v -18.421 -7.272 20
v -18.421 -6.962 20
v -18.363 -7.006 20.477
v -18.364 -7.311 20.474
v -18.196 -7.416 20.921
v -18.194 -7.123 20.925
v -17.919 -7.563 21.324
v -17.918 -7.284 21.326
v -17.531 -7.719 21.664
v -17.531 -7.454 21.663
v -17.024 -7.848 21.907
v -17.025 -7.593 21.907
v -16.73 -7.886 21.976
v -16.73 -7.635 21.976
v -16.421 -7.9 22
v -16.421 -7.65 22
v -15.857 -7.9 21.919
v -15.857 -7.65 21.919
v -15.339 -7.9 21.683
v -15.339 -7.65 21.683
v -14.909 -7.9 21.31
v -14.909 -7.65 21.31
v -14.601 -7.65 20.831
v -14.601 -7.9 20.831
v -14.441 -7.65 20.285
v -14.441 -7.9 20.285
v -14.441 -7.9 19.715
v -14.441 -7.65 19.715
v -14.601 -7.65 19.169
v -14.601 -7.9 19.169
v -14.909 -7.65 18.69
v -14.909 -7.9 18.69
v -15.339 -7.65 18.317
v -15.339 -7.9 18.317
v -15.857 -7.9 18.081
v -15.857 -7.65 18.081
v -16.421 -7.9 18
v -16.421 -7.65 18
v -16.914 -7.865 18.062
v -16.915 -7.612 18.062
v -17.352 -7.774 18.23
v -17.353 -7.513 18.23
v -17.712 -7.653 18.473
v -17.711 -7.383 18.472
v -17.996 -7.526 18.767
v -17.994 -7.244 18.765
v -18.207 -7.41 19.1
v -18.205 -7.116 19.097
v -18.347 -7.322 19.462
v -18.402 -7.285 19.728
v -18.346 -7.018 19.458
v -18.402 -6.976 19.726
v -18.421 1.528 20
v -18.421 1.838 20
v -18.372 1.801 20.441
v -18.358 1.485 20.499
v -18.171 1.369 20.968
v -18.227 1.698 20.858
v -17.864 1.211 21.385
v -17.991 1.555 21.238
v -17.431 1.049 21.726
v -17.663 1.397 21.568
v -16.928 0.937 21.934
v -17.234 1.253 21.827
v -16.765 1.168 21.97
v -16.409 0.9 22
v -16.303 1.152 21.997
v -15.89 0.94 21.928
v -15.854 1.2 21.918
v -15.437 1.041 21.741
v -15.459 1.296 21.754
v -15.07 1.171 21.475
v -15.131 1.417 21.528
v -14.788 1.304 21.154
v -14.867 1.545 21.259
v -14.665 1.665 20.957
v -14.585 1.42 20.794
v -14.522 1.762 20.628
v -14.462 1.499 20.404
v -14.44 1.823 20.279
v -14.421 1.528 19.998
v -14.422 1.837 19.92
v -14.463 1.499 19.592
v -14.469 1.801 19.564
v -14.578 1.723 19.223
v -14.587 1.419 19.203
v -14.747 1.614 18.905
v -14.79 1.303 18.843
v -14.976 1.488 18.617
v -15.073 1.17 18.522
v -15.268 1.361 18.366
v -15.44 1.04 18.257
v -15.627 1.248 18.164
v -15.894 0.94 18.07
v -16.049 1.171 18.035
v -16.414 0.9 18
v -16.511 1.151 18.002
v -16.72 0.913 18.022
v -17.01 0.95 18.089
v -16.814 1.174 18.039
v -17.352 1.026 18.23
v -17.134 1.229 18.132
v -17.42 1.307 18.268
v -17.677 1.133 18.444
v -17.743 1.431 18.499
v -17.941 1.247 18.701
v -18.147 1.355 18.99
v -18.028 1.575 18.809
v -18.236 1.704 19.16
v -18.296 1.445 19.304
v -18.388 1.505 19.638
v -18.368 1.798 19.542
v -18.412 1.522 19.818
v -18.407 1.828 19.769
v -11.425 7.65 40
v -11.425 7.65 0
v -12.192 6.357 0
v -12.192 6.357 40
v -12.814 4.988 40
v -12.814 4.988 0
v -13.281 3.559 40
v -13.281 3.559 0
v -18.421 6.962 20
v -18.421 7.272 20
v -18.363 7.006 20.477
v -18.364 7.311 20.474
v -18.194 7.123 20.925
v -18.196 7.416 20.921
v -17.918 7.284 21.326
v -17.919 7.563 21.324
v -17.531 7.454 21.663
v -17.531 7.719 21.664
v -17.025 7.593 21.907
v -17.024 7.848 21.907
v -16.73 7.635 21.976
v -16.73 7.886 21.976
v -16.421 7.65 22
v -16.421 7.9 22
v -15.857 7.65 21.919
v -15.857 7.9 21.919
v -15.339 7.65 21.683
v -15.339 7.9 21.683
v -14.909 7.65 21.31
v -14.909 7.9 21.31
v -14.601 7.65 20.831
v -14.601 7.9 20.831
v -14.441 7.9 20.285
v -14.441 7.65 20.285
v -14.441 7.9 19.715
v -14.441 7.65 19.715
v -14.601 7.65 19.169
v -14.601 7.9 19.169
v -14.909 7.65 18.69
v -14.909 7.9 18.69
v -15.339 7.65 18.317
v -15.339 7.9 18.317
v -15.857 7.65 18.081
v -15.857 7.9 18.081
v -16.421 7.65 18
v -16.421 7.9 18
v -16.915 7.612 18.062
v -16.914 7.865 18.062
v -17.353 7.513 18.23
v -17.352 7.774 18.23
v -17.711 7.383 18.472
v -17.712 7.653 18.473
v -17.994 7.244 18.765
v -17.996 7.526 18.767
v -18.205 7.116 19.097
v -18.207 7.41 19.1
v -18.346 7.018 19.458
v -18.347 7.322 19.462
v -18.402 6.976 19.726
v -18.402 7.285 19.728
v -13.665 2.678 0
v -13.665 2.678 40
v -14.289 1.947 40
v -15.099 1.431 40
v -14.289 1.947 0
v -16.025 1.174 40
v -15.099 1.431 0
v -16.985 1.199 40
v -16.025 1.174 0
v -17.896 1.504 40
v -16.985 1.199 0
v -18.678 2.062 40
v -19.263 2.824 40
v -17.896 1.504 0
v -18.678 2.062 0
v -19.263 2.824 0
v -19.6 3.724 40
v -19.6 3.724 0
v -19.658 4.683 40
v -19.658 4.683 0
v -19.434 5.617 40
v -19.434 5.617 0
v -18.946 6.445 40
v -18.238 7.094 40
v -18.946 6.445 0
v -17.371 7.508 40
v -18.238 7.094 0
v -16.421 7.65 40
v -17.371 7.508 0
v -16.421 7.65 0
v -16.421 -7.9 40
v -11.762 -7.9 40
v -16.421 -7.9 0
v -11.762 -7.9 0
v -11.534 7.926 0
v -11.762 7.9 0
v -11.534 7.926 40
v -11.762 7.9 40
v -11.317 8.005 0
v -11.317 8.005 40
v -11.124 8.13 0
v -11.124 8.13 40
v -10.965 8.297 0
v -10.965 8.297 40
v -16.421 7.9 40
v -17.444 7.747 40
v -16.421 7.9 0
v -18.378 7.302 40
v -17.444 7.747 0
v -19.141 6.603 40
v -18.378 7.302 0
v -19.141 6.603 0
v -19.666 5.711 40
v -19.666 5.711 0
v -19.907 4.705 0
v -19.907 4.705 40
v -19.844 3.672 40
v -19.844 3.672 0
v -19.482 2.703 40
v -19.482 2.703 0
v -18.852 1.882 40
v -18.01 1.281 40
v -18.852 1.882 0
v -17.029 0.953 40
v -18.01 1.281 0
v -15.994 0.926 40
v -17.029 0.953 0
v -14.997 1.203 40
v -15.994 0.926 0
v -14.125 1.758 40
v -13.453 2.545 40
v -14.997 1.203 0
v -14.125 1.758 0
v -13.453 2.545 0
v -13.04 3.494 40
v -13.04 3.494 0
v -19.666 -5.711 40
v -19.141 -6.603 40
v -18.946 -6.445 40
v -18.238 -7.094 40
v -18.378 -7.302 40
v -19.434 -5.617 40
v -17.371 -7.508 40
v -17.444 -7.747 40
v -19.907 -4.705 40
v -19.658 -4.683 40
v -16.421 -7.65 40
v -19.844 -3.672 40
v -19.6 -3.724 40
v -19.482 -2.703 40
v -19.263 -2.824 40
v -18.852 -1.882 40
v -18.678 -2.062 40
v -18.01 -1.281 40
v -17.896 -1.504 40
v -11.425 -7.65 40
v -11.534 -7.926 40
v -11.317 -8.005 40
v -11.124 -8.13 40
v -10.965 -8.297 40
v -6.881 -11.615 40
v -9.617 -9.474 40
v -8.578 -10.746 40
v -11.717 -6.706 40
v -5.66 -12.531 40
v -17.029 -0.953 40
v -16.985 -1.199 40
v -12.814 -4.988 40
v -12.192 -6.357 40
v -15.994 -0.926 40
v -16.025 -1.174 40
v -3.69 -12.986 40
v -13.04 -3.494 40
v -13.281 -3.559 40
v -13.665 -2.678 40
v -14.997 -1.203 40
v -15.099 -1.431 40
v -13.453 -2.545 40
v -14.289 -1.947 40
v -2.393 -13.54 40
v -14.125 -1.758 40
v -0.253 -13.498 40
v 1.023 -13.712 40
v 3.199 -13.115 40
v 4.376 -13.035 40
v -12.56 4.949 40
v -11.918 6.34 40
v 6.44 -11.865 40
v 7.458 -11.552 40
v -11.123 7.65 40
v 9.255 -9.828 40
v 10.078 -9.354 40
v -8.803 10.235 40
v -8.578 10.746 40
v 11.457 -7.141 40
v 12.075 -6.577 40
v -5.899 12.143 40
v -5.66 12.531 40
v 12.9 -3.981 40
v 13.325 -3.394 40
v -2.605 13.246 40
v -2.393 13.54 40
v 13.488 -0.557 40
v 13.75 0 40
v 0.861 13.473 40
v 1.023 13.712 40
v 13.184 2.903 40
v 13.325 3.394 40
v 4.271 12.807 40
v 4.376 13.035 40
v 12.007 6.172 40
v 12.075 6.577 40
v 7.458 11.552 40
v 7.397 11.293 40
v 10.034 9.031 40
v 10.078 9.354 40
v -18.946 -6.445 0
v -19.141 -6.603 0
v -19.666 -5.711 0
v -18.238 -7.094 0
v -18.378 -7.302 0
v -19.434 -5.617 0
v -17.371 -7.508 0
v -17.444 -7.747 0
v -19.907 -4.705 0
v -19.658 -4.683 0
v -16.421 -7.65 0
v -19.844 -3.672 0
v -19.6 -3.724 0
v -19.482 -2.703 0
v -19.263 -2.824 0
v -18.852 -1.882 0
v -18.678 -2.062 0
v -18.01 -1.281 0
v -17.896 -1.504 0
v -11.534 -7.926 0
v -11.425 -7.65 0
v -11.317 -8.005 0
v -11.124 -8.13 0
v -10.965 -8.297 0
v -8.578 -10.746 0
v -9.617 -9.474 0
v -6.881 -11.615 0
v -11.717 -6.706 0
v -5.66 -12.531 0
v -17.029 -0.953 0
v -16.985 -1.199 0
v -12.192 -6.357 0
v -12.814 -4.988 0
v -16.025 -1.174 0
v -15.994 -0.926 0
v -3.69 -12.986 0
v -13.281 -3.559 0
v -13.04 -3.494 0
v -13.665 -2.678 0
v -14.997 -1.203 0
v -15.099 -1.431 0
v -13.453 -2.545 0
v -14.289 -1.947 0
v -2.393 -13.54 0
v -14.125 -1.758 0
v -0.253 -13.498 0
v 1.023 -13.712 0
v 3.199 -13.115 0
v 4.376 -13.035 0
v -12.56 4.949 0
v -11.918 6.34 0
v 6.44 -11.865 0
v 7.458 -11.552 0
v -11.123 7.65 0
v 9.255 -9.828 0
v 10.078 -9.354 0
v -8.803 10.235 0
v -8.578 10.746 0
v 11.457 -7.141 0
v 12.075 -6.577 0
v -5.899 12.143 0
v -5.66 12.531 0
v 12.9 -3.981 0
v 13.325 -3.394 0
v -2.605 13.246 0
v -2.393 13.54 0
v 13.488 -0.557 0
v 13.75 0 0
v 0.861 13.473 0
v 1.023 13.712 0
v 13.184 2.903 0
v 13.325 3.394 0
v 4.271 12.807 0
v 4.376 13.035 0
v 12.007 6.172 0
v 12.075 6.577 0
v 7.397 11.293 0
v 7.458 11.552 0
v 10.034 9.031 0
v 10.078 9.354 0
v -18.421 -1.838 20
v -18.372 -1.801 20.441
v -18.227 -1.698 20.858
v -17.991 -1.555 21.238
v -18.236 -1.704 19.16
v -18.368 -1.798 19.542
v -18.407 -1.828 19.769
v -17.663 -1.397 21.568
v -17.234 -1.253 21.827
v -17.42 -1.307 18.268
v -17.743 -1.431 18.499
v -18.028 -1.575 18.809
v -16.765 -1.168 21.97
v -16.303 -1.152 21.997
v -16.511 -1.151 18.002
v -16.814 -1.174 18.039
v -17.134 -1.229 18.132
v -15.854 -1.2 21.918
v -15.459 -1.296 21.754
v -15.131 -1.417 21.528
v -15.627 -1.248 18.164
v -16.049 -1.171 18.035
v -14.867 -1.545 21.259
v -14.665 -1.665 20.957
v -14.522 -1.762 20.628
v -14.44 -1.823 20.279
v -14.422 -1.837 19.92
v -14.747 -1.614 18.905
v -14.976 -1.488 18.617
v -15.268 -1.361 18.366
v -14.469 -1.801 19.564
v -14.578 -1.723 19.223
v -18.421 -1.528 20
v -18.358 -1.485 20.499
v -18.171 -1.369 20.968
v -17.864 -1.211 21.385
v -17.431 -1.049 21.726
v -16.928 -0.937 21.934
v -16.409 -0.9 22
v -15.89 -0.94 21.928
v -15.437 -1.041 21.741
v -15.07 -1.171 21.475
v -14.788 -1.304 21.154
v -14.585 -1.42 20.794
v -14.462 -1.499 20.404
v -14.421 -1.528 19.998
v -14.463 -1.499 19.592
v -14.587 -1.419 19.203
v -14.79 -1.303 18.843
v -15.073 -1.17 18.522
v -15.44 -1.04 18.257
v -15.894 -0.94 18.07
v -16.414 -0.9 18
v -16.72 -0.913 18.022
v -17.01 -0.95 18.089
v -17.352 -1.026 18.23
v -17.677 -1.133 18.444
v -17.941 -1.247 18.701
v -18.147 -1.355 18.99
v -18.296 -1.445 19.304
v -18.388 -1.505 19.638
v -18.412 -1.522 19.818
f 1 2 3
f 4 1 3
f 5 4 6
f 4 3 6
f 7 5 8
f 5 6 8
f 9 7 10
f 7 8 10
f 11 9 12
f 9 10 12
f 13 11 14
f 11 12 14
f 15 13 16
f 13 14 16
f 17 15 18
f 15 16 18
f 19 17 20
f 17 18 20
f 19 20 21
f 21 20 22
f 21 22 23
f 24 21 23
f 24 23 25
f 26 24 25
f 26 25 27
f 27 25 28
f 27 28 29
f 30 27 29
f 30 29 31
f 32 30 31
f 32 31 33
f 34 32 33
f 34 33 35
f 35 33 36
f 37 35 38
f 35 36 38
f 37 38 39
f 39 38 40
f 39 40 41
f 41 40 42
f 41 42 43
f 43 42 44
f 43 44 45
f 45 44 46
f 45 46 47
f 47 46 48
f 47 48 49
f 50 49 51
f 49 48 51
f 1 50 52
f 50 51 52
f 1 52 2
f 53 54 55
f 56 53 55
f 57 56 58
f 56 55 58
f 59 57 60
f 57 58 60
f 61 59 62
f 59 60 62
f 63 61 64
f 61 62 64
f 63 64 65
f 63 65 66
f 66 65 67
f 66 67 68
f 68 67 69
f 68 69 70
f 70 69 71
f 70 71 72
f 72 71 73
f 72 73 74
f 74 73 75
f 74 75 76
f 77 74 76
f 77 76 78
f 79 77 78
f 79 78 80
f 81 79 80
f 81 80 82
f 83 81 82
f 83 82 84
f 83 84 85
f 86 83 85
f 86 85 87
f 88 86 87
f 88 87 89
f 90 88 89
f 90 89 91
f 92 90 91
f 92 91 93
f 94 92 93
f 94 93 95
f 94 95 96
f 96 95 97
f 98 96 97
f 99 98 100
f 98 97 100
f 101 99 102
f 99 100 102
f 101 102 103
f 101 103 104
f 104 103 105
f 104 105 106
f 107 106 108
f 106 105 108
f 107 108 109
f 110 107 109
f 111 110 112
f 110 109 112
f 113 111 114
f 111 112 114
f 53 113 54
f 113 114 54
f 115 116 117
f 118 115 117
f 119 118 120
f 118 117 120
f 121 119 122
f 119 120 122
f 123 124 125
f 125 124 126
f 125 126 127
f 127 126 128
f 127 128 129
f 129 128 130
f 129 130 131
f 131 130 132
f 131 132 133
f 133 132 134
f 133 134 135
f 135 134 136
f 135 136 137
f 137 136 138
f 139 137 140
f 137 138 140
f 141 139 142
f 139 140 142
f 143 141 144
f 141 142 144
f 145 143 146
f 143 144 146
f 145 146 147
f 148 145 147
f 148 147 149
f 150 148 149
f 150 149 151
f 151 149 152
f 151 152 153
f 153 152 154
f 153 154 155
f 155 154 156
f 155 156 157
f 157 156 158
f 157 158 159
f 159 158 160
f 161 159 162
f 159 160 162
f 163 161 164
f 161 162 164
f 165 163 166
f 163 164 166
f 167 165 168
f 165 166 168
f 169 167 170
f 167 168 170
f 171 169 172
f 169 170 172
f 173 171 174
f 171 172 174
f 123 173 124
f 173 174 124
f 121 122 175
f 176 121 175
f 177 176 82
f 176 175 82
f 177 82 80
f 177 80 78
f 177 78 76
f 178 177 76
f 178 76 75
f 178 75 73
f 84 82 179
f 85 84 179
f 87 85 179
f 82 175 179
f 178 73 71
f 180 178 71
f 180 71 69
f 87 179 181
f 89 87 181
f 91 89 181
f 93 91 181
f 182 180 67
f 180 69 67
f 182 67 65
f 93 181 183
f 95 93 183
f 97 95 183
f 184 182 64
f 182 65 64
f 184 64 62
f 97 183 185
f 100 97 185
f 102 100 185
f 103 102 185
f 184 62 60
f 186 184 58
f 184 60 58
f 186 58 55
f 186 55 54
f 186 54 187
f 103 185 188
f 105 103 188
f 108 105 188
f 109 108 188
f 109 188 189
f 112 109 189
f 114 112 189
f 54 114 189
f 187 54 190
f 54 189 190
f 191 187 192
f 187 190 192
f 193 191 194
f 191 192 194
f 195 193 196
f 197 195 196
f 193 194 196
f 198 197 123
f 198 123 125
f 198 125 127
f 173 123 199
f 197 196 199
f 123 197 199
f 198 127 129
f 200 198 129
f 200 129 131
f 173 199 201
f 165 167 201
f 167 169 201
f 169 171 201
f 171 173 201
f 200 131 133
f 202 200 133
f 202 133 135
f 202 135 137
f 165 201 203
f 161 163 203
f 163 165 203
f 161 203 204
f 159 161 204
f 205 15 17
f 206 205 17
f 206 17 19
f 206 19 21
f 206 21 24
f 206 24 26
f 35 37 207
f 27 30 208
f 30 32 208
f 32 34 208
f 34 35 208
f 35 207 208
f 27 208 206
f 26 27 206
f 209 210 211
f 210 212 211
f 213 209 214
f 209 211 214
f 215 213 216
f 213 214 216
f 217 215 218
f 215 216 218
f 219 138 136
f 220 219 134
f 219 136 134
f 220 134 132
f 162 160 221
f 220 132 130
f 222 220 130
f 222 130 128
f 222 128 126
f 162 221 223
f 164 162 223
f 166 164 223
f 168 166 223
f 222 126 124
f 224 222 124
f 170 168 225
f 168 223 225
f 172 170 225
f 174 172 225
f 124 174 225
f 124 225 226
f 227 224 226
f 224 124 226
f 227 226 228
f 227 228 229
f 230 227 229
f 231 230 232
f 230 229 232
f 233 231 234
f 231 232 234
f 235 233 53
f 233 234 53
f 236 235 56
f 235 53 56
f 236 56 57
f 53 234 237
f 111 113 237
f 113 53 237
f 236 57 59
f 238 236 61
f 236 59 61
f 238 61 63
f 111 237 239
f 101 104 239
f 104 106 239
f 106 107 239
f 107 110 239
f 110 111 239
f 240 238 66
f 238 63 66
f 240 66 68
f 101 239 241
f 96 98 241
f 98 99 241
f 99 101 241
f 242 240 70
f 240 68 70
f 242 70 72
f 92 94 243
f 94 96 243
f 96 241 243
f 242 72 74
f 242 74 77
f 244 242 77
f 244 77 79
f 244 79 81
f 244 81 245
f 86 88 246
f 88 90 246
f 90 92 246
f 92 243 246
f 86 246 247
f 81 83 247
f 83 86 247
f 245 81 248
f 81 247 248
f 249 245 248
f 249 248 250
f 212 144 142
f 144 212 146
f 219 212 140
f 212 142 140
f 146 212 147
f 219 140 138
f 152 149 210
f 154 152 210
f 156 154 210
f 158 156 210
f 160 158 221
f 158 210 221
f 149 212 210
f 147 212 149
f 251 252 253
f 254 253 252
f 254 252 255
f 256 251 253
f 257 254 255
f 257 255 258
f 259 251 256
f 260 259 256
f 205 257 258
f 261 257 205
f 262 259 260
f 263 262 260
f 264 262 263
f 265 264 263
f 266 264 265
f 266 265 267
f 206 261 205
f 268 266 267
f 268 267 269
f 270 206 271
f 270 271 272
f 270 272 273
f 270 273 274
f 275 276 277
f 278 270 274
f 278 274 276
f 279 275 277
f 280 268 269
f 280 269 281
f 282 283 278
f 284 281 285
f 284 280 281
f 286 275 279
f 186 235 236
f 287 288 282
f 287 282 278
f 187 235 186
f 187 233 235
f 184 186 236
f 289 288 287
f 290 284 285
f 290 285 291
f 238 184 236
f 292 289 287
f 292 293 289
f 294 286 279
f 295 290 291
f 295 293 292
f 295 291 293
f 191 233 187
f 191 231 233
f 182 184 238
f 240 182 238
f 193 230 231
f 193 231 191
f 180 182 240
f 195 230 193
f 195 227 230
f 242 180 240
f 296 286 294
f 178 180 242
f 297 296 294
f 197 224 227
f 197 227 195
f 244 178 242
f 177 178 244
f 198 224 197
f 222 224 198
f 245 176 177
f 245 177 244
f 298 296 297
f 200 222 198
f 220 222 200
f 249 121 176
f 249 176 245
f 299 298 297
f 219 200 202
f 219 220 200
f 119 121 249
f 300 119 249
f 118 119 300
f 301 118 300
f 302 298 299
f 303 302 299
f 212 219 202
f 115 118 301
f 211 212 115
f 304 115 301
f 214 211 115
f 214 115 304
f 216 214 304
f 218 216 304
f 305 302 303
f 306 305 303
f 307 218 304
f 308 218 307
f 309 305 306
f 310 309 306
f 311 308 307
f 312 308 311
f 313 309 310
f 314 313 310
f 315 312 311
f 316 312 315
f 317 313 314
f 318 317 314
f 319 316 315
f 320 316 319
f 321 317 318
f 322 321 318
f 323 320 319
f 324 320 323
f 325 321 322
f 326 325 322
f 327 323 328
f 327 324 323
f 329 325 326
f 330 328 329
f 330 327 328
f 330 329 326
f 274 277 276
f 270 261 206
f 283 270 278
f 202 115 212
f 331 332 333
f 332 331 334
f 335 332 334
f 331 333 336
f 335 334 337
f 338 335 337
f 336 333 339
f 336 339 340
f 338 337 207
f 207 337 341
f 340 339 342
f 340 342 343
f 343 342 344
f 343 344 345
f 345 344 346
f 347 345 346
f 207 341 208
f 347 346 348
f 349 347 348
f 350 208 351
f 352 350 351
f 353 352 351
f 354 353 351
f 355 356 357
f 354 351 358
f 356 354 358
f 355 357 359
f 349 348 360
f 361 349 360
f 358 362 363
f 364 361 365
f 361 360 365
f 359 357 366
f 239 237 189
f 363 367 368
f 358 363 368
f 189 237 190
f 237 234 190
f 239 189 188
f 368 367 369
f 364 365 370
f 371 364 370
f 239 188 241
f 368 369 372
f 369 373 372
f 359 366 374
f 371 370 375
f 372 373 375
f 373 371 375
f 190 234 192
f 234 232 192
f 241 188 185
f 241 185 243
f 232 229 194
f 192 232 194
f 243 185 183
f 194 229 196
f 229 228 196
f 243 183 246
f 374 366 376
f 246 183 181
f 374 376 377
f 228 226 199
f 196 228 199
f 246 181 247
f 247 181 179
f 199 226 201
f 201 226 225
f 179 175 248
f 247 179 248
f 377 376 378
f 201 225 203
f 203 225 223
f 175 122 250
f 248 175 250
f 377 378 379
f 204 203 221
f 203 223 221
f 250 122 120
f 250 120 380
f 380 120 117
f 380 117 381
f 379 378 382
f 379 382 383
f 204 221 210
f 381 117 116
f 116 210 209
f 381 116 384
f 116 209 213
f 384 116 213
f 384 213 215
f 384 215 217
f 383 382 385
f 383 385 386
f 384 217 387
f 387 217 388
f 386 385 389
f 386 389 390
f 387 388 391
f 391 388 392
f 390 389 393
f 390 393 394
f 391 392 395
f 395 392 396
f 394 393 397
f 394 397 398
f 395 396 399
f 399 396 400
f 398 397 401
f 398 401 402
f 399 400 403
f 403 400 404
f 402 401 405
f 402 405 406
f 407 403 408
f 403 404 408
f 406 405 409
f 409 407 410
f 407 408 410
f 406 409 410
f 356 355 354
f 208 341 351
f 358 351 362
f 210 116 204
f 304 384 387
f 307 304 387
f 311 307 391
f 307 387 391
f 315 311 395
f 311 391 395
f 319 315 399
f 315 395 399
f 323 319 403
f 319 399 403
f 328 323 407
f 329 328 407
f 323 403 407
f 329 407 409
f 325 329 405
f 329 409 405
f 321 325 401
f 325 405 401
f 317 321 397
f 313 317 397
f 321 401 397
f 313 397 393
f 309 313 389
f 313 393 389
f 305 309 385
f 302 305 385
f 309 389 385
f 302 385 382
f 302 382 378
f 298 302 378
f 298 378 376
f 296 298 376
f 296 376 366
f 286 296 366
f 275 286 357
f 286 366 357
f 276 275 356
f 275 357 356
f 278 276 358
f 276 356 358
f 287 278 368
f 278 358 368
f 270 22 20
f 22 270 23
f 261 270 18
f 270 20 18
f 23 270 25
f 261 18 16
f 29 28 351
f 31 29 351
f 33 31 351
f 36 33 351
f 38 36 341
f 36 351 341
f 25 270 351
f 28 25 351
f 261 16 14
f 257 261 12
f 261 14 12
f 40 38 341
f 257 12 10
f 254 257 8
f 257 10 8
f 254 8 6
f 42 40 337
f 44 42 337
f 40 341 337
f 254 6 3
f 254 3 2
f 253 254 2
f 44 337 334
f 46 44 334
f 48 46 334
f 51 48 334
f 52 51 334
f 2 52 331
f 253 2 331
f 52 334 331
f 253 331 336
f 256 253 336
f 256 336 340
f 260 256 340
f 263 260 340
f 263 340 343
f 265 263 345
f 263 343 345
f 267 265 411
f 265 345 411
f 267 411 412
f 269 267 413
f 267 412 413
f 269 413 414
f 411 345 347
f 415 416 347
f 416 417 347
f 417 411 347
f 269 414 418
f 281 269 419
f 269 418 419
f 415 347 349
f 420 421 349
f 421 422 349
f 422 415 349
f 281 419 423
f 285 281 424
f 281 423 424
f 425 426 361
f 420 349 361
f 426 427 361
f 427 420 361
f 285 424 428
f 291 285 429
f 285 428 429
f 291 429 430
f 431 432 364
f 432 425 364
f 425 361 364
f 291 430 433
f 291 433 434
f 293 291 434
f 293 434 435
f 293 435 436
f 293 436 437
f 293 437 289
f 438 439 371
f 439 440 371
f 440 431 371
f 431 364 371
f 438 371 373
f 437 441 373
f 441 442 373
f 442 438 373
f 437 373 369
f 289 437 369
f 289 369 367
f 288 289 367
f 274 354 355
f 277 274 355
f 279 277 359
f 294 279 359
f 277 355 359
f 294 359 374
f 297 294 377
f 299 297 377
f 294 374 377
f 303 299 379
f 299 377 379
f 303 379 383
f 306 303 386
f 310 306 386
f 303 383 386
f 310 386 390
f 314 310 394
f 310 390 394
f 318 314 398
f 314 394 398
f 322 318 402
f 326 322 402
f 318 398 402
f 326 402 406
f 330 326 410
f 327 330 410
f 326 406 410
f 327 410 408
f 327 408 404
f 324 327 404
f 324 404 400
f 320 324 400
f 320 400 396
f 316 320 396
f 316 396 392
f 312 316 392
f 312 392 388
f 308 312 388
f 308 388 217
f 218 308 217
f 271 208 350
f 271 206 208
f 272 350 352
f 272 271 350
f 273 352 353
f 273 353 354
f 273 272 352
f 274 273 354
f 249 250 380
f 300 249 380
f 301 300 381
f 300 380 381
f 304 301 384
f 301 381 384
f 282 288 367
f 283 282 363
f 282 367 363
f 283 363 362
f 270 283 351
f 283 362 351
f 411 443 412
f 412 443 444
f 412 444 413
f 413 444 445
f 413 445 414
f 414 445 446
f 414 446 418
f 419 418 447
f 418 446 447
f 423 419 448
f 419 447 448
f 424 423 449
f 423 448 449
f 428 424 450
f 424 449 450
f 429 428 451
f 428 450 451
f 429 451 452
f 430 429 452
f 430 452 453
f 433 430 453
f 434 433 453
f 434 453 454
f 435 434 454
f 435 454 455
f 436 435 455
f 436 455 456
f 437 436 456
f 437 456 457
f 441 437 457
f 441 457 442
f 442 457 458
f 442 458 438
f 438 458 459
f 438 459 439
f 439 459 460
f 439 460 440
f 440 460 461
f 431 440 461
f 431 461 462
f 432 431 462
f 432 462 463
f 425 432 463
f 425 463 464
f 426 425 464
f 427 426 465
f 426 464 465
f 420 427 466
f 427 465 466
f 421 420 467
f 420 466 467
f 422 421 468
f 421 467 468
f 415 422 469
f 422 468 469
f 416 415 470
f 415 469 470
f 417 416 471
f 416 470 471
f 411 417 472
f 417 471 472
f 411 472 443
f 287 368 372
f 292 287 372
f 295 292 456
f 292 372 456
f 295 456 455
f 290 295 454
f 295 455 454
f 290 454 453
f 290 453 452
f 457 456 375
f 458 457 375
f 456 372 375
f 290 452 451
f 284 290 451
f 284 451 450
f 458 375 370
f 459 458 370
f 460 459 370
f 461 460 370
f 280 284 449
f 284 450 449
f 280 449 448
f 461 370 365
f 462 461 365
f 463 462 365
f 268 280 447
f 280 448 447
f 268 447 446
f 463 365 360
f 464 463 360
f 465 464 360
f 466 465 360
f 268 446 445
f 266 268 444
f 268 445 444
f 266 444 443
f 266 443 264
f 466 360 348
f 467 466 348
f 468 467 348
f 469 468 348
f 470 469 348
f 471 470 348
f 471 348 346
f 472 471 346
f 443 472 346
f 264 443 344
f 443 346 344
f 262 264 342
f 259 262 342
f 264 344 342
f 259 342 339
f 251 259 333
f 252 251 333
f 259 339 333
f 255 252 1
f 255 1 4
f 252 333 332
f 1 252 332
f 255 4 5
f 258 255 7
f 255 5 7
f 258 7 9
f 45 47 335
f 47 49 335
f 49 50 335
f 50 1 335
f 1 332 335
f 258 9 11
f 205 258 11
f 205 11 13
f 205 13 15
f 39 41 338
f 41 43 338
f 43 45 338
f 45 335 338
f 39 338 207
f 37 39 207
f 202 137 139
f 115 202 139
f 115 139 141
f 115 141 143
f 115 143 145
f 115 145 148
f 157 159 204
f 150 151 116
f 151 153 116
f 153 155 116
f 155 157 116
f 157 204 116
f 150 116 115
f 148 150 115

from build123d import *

# Parameters (mm, degrees)
F1_DEPTH = 40
F2_R     = 1
F3_R     = 2
F4_DEPTH = 25


with BuildPart() as f1:
    # F0 (on Top) → F1 (new body)
    with BuildSketch(Plane.XY):
        with BuildLine():
            ThreePointArc((-11.123339, 7.649924), (13.304653, -2.288275), (-13.039999, -3.494057))
            ThreePointArc((-13.039999, -3.494057), (-19.197476, -2.269259), (-16.420739, -7.899924))
            Line((-16.420739, -7.899924), (-11.254053, -7.899924))
            ThreePointArc((-11.254053, -7.899924), (13.75, 0), (-11.254053, 7.899924))
            ThreePointArc((-11.254053, 7.899924), (-11.340446, 7.775396), (-11.425461, 7.649924))
            Line((-11.425461, 7.649924), (-11.123339, 7.649924))
        make_face()
        with BuildLine():
            ThreePointArc((-16.420739, -7.649924), (-18.999137, -2.421449), (-13.28148, -3.558762))
            ThreePointArc((-13.28148, -3.558762), (-12.521687, -5.680657), (-11.425461, -7.649924))
            Line((-11.425461, -7.649924), (-15.121701, -7.649924))
            Line((-15.121701, -7.649924), (-16.420739, -7.649924))
        make_face(mode=Mode.SUBTRACT)
        with BuildLine():
            ThreePointArc((-13.039999, 3.494057), (-12.259059, 5.653802), (-11.123339, 7.649924))
            Line((-11.123339, 7.649924), (-11.425461, 7.649924))
            ThreePointArc((-11.425461, 7.649924), (-11.340446, 7.775396), (-11.254053, 7.899924))
            Line((-11.254053, 7.899924), (-16.420739, 7.899924))
            ThreePointArc((-16.420739, 7.899924), (-19.197476, 2.269259), (-13.039999, 3.494057))
        make_face()
        with BuildLine():
            Line((-15.121701, 7.649924), (-11.425461, 7.649924))
            ThreePointArc((-11.425461, 7.649924), (-12.521687, 5.680657), (-13.28148, 3.558762))
            ThreePointArc((-13.28148, 3.558762), (-18.999137, 2.421449), (-16.420739, 7.649924))
            Line((-16.420739, 7.649924), (-15.121701, 7.649924))
        make_face(mode=Mode.SUBTRACT)
    extrude(amount=F1_DEPTH)

    # F2
    f2_edges = [f1.edges().sort_by_distance(p)[0] for p in [
        (-11.254053, 7.899924, 20),
        (-11.254053, -7.899924, 20),
    ]]
    fillet(f2_edges, radius=F2_R)

    # F3 (on face) → F4 (cut)
    with BuildSketch(Plane(origin=(0, 7.899924, 0), x_dir=(-1, 0, 0), z_dir=(0, 1, 0))):
        with Locations((16.420739, 20)):
            Circle(F3_R)
    extrude(amount=-F4_DEPTH, mode=Mode.SUBTRACT)


solid = f1.part
